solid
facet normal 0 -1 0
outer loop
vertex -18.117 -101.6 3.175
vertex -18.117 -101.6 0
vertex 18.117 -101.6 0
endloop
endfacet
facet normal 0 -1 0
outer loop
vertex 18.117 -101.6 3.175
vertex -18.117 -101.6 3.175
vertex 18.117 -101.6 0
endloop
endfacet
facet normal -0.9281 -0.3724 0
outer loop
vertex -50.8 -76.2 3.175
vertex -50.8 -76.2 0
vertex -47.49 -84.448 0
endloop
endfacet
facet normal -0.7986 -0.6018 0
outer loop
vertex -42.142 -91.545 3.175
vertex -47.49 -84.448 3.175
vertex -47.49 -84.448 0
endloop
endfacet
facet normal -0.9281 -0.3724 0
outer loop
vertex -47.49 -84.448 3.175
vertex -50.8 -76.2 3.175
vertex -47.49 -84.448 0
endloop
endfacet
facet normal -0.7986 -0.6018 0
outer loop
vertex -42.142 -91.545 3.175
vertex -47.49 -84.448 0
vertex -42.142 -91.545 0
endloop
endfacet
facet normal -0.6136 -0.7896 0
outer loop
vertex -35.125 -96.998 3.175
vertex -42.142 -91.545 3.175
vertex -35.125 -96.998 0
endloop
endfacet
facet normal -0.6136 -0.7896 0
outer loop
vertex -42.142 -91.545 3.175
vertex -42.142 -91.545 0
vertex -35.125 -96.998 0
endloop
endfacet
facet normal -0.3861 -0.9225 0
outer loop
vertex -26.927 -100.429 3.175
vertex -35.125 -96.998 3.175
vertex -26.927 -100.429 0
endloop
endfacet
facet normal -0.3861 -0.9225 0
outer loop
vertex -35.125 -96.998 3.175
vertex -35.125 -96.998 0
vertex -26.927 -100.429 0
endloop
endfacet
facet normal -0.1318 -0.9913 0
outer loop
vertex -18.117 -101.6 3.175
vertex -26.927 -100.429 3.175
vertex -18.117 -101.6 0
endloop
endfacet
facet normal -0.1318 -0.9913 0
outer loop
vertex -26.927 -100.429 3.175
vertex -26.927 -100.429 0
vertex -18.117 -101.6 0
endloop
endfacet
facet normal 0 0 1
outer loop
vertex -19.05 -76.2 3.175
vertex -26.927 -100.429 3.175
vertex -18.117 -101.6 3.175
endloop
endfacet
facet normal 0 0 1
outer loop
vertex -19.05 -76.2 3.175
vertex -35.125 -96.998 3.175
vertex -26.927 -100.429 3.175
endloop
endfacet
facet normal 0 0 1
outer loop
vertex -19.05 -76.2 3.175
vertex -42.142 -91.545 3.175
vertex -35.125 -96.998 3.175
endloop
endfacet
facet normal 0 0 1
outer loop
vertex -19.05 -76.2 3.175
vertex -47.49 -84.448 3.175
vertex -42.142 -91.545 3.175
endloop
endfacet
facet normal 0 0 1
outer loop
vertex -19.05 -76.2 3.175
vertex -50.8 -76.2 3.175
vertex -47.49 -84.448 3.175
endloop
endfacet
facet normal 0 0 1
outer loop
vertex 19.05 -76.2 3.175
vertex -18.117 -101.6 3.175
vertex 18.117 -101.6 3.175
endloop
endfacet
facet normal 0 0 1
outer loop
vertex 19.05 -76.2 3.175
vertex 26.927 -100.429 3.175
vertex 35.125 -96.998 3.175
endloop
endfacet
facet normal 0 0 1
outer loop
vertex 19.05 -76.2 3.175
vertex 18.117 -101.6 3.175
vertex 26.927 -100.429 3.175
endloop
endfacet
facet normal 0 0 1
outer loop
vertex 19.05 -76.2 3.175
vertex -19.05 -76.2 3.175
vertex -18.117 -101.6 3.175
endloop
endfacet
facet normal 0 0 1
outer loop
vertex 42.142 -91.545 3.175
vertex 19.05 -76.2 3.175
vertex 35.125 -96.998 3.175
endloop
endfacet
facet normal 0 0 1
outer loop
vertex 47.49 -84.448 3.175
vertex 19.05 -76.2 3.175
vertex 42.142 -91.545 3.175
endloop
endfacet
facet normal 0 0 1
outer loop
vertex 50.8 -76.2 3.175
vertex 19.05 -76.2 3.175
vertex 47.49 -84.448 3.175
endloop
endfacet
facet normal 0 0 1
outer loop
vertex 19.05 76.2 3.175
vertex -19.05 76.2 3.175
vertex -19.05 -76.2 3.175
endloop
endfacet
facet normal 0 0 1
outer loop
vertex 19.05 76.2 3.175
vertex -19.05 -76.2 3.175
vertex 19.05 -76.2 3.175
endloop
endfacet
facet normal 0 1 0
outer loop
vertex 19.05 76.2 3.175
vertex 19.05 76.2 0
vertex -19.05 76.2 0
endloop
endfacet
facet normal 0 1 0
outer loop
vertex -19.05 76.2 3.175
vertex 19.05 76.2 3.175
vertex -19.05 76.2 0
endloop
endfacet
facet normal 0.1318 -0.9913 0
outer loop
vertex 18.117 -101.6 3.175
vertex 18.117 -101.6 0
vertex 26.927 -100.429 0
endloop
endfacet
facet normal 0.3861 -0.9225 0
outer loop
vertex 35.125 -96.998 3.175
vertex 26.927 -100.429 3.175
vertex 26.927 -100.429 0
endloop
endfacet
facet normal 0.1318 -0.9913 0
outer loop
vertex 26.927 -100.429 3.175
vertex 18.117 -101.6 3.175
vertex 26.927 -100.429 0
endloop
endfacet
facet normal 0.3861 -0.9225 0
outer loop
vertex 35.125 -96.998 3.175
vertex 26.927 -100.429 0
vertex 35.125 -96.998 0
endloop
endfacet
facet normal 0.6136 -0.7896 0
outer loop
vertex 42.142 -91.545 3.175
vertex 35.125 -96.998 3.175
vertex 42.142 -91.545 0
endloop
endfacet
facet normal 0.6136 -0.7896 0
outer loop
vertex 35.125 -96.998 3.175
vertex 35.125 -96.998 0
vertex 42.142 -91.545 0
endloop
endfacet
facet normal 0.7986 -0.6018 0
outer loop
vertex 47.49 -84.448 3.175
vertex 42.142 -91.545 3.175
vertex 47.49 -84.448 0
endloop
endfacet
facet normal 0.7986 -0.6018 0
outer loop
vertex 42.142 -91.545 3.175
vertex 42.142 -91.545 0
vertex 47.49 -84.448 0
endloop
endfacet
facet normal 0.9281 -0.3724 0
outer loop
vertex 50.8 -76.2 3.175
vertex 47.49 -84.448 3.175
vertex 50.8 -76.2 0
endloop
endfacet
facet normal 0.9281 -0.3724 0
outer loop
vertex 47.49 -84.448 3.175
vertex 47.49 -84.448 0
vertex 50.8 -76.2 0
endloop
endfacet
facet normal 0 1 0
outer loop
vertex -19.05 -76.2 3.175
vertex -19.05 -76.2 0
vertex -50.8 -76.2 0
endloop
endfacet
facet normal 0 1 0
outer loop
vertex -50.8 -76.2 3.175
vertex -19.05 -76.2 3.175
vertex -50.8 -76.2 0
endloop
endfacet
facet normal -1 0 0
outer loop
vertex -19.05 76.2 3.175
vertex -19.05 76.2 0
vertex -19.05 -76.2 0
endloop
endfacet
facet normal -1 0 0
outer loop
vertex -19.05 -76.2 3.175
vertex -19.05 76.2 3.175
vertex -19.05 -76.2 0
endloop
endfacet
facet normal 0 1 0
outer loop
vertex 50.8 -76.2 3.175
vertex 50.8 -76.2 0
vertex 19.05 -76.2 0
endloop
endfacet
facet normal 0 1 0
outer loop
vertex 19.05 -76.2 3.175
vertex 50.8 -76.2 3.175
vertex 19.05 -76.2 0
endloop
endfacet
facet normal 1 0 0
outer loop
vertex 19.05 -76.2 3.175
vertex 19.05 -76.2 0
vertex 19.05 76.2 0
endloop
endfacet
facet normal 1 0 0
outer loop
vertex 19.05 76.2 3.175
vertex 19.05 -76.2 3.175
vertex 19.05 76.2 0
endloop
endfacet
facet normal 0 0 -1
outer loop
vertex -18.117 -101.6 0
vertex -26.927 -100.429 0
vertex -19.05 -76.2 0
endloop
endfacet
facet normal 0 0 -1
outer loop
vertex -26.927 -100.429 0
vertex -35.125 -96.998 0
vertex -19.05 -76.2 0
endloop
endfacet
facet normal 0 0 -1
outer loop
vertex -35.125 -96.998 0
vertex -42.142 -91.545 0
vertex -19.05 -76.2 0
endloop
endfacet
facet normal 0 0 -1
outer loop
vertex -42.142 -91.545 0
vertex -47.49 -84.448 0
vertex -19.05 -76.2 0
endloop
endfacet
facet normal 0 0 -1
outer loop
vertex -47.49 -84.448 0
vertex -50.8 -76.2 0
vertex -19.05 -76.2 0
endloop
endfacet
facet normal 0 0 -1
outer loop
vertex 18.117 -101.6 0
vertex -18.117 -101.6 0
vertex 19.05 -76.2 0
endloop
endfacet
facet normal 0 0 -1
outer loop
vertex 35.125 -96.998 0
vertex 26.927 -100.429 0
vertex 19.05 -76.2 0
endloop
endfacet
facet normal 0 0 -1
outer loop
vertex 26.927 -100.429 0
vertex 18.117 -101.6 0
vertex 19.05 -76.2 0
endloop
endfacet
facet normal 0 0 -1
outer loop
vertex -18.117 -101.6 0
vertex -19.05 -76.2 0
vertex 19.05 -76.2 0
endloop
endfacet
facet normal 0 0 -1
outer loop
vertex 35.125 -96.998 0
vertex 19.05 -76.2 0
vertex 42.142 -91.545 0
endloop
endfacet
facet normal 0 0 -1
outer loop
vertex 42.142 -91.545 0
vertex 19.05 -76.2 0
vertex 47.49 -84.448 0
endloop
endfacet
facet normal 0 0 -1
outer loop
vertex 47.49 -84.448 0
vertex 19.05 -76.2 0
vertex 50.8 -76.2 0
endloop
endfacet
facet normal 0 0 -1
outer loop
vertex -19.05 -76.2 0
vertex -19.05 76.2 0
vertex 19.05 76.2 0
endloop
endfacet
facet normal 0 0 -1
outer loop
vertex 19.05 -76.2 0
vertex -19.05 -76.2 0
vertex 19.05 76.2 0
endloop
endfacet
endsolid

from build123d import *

# Parameters (mm, degrees)
F1_DEPTH    = 3.175
F2_T1_DEPTH = 166.5877767412


# Not quite as in the source:
# - a fillet or chamfer that OpenCascade refuses, or shapes differently, is made with other operations: its cross-section is extruded or revolved along the edge and cut away or added


with BuildPart() as f1:
    # F0 (on Top) → F1 (new body)
    with BuildSketch(Plane.XY):
        Polygon((19.05, -76.2), (19.05, 76.2), (-19.05, 76.2), (-19.05, -76.2), (-50.8, -76.2), (-50.8, -101.6), (50.8, -101.6), (50.8, -76.2), align=None)
    extrude(amount=F1_DEPTH)

    # F2: fillet of radius 33.7265634664 on 2 edges, made by hand

    # F2_s2 → F2_t1 (cut)
    with BuildSketch(Plane.XY.offset(-81.7063883706)):
        with BuildLine():
            ThreePointArc((-50.8, -76.2), (-38.8135156804, -94.5033769622), (-18.1174446518, -101.6))
            Line((-18.1174446518, -101.6), (-50.8, -101.6))
            Line((-50.8, -101.6), (-50.8, -76.2))
        make_face()
        with BuildLine():
            ThreePointArc((18.1174446518, -101.6), (38.8135156804, -94.5033769622), (50.8, -76.2))
            Line((50.8, -76.2), (50.8, -101.6))
            Line((50.8, -101.6), (18.1174446518, -101.6))
        make_face()
    extrude(amount=F2_T1_DEPTH, mode=Mode.SUBTRACT)


solid = f1.part
